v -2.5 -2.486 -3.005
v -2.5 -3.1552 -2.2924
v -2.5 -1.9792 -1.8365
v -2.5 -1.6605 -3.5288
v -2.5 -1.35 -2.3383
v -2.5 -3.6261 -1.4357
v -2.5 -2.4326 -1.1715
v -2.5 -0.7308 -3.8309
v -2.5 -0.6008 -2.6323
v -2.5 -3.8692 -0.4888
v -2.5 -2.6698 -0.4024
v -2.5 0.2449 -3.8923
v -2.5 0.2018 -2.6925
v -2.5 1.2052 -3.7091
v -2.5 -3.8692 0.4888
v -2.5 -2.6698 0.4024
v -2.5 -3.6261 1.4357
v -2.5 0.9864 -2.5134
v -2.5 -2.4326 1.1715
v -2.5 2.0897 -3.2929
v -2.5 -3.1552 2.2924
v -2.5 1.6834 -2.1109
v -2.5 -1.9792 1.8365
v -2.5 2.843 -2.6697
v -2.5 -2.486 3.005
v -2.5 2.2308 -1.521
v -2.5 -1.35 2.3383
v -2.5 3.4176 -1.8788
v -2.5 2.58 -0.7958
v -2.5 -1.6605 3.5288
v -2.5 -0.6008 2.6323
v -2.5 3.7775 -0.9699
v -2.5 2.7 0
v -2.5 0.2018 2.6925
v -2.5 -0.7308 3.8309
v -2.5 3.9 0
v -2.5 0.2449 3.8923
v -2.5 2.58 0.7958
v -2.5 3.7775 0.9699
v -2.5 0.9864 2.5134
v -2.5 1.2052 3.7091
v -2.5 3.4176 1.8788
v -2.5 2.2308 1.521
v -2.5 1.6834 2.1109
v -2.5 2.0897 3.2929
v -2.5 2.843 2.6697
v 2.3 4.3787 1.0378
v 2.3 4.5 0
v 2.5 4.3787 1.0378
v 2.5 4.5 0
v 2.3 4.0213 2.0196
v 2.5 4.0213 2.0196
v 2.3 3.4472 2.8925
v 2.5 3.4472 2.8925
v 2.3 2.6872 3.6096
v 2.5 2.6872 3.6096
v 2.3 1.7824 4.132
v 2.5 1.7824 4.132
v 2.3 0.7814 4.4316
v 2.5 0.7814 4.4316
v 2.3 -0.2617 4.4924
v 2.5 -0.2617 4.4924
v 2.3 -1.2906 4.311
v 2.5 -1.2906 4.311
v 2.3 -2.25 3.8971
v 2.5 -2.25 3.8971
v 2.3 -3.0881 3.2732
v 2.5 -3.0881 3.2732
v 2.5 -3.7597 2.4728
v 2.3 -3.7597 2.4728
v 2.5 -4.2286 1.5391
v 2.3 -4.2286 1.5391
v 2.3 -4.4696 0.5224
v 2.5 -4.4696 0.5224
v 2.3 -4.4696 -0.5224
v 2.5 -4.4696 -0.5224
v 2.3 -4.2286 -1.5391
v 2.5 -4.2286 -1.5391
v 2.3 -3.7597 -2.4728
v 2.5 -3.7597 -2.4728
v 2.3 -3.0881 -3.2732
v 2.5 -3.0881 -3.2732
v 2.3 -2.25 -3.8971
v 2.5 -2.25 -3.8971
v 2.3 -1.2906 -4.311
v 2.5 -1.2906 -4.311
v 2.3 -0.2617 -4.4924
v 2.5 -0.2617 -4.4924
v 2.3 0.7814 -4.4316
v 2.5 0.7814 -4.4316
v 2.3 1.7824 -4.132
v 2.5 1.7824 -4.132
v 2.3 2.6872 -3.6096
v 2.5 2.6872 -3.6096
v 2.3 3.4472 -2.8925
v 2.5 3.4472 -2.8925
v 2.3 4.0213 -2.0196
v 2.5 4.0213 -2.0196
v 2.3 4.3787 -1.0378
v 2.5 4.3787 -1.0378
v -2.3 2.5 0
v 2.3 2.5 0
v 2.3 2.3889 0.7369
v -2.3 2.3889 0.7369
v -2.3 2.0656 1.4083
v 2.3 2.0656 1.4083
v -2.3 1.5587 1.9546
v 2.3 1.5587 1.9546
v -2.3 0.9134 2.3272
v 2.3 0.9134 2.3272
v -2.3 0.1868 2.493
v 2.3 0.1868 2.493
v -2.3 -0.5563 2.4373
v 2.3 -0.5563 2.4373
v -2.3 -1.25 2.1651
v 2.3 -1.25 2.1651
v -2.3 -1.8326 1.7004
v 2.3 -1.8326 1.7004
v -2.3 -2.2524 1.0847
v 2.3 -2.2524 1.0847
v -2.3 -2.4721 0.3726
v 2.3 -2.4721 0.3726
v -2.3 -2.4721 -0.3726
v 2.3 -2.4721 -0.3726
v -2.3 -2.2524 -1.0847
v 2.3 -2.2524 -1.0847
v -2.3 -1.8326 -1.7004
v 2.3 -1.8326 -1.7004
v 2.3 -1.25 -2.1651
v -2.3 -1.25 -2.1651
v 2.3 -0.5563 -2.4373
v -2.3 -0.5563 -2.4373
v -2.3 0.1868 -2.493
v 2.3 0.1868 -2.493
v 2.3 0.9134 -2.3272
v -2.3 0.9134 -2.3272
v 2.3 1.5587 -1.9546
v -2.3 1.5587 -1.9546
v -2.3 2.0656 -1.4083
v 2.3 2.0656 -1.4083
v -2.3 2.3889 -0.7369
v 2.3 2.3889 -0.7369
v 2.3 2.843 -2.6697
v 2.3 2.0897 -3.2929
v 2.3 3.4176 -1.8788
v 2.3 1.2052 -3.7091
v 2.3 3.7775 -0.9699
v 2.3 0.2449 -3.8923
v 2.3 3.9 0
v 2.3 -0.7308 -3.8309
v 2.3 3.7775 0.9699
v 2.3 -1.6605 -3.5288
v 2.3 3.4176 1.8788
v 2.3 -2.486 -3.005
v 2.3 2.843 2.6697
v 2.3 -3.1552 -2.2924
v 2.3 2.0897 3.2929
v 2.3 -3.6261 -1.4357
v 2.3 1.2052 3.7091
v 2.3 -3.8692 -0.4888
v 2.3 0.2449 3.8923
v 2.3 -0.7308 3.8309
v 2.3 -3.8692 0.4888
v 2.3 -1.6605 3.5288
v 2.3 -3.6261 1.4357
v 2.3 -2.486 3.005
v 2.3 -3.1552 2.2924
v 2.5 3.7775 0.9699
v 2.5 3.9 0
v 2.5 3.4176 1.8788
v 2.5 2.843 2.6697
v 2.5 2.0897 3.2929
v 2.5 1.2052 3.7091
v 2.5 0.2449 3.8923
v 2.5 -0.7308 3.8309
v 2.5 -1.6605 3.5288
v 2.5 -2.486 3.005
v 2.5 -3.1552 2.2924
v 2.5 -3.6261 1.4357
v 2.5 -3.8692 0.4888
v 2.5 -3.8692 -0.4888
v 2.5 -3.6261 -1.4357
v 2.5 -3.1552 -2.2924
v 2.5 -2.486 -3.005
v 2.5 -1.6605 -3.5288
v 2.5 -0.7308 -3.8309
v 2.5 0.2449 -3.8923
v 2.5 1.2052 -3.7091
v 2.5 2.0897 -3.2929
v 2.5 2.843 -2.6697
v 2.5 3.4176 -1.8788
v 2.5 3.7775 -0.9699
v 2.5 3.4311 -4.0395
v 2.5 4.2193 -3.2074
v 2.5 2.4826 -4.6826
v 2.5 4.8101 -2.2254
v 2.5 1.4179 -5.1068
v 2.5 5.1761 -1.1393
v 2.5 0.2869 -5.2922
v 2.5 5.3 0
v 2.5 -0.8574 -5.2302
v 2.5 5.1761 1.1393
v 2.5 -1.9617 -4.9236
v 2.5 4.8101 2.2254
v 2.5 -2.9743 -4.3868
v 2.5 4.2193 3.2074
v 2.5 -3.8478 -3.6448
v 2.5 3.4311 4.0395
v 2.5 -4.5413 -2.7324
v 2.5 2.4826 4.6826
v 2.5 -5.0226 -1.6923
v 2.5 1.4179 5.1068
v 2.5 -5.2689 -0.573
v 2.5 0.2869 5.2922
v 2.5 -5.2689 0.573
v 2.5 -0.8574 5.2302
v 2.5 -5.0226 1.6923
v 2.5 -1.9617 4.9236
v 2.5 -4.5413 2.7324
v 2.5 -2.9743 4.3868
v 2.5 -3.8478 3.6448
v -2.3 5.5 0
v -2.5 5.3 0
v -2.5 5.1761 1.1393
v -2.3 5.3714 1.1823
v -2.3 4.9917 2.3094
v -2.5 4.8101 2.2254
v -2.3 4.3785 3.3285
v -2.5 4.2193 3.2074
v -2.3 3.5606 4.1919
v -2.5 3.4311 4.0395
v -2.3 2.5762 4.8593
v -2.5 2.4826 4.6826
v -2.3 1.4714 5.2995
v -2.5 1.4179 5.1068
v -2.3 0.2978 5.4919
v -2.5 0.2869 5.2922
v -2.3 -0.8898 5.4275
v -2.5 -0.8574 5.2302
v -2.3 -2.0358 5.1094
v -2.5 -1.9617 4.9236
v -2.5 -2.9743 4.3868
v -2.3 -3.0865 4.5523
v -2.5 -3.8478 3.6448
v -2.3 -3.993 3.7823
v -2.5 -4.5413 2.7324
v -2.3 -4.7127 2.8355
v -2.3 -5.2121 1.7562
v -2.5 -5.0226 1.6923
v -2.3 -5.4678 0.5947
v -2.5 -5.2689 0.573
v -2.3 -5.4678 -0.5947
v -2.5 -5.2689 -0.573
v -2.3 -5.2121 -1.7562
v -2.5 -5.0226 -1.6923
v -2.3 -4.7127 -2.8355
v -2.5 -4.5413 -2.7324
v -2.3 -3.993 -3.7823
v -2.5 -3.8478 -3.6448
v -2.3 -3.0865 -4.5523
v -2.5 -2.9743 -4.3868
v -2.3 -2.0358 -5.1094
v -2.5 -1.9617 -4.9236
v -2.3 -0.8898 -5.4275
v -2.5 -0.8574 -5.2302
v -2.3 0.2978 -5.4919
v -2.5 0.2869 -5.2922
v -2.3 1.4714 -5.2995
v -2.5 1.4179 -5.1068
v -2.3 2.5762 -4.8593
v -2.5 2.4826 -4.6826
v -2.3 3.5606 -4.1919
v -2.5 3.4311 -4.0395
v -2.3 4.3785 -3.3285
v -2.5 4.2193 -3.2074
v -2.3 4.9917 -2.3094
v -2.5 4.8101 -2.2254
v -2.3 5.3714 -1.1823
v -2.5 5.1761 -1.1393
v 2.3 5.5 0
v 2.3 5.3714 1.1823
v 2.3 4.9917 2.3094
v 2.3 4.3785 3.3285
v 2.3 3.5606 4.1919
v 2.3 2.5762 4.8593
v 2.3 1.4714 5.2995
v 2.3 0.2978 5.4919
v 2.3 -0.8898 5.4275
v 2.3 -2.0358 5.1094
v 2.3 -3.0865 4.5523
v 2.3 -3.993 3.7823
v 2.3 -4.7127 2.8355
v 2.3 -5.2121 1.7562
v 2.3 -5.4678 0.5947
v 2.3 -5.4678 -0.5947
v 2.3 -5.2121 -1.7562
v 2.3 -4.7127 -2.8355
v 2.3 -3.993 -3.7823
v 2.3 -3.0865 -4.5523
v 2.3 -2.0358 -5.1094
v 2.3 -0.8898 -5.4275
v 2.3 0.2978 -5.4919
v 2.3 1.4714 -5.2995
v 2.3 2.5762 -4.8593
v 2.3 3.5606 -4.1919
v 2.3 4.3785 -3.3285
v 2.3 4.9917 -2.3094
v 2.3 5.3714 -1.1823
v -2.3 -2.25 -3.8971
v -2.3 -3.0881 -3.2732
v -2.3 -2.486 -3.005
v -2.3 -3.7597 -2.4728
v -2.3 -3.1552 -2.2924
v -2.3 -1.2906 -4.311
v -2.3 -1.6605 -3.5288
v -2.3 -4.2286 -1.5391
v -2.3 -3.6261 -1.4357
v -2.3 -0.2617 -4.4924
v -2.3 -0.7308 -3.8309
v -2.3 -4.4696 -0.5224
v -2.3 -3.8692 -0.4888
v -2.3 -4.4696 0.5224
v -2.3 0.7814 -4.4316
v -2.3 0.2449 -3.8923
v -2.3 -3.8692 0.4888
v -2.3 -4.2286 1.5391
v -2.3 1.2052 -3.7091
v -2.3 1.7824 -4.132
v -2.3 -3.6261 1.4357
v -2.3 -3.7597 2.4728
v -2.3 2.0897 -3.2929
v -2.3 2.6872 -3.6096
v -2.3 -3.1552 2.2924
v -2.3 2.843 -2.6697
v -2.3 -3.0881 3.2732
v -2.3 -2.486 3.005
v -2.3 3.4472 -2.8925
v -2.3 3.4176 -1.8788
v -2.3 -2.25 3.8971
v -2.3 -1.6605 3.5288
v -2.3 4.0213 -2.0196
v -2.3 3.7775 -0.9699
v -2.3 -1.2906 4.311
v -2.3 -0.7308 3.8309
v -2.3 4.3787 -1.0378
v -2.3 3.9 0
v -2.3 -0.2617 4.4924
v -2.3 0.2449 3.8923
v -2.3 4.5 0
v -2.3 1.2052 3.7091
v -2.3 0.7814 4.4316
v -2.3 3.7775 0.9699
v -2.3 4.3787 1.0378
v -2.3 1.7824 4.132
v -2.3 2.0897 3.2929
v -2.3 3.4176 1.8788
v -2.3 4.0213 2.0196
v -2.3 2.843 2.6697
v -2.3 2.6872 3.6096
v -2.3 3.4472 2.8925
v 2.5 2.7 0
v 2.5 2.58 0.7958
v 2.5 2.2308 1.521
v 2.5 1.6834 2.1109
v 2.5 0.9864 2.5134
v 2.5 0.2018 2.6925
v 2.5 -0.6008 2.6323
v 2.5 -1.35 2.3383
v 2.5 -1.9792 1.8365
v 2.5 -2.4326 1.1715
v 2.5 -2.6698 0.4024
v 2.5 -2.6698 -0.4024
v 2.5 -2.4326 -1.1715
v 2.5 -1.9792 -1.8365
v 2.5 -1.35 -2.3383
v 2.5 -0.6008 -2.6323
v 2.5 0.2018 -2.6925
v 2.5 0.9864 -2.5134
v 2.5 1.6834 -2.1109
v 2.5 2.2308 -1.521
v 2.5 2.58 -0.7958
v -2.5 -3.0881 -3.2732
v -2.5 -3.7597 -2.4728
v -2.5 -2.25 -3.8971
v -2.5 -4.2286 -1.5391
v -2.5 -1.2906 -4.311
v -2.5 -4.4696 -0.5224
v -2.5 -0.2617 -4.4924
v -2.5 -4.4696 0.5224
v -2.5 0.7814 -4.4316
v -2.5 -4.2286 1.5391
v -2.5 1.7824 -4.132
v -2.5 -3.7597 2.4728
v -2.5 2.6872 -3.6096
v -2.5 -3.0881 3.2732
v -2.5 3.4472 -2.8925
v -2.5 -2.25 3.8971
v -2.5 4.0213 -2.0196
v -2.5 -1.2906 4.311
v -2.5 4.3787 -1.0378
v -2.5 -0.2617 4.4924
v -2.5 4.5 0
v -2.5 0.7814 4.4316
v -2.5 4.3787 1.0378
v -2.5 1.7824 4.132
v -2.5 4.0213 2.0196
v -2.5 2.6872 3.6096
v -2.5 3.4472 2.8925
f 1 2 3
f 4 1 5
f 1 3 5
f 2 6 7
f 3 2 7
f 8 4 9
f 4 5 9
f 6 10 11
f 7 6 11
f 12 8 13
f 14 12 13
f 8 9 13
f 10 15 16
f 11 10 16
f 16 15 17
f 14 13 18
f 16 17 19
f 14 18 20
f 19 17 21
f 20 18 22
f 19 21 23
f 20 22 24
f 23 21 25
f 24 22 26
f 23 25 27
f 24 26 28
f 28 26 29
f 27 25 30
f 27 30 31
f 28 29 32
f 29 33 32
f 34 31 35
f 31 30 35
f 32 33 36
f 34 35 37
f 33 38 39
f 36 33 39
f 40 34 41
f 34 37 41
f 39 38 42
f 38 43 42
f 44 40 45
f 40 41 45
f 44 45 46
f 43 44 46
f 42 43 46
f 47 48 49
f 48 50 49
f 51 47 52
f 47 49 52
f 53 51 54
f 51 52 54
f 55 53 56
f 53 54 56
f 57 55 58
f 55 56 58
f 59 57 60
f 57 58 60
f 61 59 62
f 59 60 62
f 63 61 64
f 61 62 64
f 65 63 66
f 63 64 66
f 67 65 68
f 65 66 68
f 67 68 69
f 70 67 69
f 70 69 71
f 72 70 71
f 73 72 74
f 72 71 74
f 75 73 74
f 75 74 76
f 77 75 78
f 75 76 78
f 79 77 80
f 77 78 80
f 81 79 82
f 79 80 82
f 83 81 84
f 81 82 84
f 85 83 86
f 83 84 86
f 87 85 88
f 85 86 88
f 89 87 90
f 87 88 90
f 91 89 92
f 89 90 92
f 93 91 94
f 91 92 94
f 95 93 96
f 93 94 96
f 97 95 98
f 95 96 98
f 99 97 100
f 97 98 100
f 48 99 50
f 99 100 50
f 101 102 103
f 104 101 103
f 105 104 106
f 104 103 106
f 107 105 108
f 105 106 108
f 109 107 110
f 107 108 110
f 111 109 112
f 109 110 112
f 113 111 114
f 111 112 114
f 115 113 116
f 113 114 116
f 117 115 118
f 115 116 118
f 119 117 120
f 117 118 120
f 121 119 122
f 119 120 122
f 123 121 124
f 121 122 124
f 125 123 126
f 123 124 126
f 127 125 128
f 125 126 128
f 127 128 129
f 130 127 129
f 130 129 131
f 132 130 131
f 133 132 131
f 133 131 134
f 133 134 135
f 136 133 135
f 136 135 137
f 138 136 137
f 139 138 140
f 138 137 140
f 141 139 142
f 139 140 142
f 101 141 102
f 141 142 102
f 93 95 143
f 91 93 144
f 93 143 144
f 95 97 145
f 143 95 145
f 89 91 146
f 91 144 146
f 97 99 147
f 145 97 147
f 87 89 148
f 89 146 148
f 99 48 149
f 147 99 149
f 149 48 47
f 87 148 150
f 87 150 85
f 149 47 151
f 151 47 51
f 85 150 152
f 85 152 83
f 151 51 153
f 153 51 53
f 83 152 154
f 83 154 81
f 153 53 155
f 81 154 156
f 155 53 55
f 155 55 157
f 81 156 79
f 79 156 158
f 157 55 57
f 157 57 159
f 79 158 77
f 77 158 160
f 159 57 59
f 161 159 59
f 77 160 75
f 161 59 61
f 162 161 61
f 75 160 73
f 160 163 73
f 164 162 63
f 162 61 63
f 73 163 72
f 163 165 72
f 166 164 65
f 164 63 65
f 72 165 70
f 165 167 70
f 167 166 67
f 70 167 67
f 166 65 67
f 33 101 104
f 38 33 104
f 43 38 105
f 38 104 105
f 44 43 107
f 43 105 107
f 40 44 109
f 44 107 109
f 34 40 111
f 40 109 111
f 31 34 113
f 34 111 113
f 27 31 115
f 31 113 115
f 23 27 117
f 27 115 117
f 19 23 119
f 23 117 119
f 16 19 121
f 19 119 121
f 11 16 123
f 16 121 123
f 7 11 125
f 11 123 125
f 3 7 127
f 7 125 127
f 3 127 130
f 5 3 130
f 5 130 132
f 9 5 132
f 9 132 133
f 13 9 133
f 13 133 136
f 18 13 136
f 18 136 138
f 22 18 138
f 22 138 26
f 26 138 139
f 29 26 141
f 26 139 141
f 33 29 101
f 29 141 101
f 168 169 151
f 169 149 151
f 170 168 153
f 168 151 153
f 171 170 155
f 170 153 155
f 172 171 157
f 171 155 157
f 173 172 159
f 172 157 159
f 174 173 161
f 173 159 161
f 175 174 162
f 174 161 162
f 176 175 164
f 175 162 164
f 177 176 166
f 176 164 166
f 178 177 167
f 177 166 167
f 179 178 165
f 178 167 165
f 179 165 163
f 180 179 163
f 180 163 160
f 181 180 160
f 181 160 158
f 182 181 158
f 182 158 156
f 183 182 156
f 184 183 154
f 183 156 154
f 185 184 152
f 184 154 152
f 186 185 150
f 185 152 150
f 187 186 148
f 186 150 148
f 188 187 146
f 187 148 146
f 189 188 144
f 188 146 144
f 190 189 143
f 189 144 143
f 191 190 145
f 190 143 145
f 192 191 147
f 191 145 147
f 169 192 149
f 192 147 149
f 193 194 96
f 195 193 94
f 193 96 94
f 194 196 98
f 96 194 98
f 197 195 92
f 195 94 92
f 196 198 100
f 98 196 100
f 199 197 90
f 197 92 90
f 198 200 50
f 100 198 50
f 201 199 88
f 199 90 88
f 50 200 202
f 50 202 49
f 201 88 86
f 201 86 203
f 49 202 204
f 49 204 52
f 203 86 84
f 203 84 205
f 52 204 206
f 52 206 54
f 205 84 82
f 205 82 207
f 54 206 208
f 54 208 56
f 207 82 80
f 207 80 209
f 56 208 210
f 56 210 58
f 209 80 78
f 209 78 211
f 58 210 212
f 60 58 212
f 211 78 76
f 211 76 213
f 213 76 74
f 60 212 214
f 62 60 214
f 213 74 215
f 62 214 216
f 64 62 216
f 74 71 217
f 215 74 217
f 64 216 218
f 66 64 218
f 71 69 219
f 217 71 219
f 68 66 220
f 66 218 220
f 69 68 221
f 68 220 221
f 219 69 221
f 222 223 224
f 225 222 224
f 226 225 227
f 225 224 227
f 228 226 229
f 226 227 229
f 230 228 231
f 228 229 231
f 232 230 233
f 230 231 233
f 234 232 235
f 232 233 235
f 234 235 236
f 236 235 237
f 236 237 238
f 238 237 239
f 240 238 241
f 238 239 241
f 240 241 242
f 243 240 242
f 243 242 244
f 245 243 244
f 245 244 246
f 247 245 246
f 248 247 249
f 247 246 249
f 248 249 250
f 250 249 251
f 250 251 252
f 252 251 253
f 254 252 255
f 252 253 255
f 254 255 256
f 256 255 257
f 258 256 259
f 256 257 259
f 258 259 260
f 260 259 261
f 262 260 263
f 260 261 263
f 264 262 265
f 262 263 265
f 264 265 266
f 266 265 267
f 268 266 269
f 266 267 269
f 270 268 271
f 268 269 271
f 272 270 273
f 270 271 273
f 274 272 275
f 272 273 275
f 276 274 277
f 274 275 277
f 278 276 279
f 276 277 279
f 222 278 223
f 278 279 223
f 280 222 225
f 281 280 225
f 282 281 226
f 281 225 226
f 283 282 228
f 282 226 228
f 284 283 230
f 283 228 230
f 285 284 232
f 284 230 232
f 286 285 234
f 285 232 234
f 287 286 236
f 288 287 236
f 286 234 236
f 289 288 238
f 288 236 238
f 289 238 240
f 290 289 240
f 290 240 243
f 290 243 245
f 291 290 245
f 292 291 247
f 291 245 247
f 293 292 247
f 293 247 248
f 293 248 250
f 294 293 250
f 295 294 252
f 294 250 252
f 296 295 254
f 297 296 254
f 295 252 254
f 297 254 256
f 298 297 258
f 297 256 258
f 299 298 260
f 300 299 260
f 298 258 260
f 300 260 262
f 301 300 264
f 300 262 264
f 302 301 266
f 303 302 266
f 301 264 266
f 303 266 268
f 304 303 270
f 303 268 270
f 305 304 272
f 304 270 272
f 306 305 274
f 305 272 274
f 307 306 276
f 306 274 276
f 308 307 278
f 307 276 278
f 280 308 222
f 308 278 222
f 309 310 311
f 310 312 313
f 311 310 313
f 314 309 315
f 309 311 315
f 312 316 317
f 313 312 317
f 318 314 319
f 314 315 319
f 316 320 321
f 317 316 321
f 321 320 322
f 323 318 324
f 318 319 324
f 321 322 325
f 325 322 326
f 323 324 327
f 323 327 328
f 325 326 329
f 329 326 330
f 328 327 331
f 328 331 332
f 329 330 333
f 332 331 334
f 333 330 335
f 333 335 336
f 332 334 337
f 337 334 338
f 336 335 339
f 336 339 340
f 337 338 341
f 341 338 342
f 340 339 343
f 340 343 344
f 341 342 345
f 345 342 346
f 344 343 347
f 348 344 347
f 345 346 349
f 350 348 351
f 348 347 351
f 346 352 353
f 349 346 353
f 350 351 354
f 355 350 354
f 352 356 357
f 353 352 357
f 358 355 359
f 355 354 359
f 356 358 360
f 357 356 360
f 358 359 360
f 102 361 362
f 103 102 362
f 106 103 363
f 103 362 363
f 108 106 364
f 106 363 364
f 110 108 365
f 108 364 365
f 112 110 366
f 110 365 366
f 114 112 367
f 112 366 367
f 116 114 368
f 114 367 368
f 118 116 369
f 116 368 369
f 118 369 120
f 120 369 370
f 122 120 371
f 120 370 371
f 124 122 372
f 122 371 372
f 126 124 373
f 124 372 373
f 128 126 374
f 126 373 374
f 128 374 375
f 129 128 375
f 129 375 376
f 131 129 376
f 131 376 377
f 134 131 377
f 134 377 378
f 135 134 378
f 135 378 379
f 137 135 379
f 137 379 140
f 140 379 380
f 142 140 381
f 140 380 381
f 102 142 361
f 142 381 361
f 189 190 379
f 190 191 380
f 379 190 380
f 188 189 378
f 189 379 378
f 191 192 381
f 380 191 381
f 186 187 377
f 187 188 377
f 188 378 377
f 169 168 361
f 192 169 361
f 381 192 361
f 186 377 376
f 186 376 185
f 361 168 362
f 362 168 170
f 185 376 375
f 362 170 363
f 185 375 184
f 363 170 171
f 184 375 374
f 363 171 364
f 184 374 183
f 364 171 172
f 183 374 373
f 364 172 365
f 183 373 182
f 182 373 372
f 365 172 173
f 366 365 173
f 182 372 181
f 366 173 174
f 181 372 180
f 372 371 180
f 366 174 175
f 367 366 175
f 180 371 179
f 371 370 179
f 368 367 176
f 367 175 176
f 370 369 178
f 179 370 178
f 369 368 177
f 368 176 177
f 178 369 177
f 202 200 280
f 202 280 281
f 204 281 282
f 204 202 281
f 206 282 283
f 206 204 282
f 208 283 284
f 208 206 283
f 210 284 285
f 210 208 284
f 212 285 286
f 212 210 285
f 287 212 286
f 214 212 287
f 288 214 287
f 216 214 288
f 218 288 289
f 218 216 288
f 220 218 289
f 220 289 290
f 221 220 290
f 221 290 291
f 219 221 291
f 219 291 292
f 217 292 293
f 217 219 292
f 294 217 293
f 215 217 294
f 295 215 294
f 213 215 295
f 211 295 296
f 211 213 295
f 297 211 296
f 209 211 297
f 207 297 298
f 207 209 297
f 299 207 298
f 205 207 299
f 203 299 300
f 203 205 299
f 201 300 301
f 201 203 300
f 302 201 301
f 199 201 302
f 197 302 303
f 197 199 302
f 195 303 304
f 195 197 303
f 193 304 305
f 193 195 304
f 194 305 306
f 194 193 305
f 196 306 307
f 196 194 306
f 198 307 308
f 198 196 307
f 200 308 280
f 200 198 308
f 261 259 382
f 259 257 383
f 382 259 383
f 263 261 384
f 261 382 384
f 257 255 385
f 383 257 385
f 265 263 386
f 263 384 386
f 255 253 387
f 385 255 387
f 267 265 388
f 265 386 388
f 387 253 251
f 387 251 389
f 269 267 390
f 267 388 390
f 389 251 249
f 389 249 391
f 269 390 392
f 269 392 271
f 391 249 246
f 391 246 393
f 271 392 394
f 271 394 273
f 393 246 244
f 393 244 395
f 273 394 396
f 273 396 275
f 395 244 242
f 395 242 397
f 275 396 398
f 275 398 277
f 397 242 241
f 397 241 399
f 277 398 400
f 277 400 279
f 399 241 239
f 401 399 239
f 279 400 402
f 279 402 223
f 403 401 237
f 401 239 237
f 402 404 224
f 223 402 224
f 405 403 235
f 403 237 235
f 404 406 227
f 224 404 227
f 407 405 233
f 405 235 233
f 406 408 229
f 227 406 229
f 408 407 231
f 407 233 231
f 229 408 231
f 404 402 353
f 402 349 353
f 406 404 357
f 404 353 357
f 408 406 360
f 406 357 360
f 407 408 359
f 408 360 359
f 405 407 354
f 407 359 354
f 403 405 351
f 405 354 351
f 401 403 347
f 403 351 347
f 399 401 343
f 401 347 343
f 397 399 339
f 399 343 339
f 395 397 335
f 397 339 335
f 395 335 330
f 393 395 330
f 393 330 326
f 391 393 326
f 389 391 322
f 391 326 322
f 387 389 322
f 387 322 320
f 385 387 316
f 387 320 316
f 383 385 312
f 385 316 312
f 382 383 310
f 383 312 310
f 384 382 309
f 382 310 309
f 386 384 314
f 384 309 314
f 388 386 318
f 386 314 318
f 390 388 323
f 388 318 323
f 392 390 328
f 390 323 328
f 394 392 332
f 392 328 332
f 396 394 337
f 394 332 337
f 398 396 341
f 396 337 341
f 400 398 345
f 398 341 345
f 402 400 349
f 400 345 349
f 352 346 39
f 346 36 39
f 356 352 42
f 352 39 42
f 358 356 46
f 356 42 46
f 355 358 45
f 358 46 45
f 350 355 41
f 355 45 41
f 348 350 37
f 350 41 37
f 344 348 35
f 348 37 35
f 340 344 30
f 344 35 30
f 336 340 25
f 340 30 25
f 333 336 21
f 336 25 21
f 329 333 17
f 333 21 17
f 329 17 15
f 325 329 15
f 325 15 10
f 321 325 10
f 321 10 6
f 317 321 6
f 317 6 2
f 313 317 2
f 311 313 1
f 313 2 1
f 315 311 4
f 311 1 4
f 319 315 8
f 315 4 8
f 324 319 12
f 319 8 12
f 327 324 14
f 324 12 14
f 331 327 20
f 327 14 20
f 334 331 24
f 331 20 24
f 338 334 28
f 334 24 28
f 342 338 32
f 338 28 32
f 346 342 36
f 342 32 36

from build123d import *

# Parameters (mm, degrees)
CHAMFER1_SIZE = 0.2


with BuildPart() as part:
    # Sketch1 → Revolve1 (revolve)
    with BuildSketch(Plane.XY):
        Polygon((2.5, 5.5), (-2.5, 5.5), (-2.5, 4.5), (-2.3, 4.5), (-2.3, 3.9), (-2.5, 3.9), (-2.5, 2.5), (2.5, 2.5), (2.5, 3.9), (2.3, 3.9), (2.3, 4.5), (2.5, 4.5), align=None)
    revolve(axis=Axis((-9.578652295, 0, 0), (1, 0, 0)))

    # Chamfer1
    chamfer1_edges = [part.edges().sort_by_distance(p)[0] for p in [
        (2.5, -5.5, 0),
        (-2.5, -5.5, 0),
        (-2.5, -2.5, 0),
        (2.5, -2.5, 0),
    ]]
    chamfer(chamfer1_edges, length=CHAMFER1_SIZE)


solid = part.part
